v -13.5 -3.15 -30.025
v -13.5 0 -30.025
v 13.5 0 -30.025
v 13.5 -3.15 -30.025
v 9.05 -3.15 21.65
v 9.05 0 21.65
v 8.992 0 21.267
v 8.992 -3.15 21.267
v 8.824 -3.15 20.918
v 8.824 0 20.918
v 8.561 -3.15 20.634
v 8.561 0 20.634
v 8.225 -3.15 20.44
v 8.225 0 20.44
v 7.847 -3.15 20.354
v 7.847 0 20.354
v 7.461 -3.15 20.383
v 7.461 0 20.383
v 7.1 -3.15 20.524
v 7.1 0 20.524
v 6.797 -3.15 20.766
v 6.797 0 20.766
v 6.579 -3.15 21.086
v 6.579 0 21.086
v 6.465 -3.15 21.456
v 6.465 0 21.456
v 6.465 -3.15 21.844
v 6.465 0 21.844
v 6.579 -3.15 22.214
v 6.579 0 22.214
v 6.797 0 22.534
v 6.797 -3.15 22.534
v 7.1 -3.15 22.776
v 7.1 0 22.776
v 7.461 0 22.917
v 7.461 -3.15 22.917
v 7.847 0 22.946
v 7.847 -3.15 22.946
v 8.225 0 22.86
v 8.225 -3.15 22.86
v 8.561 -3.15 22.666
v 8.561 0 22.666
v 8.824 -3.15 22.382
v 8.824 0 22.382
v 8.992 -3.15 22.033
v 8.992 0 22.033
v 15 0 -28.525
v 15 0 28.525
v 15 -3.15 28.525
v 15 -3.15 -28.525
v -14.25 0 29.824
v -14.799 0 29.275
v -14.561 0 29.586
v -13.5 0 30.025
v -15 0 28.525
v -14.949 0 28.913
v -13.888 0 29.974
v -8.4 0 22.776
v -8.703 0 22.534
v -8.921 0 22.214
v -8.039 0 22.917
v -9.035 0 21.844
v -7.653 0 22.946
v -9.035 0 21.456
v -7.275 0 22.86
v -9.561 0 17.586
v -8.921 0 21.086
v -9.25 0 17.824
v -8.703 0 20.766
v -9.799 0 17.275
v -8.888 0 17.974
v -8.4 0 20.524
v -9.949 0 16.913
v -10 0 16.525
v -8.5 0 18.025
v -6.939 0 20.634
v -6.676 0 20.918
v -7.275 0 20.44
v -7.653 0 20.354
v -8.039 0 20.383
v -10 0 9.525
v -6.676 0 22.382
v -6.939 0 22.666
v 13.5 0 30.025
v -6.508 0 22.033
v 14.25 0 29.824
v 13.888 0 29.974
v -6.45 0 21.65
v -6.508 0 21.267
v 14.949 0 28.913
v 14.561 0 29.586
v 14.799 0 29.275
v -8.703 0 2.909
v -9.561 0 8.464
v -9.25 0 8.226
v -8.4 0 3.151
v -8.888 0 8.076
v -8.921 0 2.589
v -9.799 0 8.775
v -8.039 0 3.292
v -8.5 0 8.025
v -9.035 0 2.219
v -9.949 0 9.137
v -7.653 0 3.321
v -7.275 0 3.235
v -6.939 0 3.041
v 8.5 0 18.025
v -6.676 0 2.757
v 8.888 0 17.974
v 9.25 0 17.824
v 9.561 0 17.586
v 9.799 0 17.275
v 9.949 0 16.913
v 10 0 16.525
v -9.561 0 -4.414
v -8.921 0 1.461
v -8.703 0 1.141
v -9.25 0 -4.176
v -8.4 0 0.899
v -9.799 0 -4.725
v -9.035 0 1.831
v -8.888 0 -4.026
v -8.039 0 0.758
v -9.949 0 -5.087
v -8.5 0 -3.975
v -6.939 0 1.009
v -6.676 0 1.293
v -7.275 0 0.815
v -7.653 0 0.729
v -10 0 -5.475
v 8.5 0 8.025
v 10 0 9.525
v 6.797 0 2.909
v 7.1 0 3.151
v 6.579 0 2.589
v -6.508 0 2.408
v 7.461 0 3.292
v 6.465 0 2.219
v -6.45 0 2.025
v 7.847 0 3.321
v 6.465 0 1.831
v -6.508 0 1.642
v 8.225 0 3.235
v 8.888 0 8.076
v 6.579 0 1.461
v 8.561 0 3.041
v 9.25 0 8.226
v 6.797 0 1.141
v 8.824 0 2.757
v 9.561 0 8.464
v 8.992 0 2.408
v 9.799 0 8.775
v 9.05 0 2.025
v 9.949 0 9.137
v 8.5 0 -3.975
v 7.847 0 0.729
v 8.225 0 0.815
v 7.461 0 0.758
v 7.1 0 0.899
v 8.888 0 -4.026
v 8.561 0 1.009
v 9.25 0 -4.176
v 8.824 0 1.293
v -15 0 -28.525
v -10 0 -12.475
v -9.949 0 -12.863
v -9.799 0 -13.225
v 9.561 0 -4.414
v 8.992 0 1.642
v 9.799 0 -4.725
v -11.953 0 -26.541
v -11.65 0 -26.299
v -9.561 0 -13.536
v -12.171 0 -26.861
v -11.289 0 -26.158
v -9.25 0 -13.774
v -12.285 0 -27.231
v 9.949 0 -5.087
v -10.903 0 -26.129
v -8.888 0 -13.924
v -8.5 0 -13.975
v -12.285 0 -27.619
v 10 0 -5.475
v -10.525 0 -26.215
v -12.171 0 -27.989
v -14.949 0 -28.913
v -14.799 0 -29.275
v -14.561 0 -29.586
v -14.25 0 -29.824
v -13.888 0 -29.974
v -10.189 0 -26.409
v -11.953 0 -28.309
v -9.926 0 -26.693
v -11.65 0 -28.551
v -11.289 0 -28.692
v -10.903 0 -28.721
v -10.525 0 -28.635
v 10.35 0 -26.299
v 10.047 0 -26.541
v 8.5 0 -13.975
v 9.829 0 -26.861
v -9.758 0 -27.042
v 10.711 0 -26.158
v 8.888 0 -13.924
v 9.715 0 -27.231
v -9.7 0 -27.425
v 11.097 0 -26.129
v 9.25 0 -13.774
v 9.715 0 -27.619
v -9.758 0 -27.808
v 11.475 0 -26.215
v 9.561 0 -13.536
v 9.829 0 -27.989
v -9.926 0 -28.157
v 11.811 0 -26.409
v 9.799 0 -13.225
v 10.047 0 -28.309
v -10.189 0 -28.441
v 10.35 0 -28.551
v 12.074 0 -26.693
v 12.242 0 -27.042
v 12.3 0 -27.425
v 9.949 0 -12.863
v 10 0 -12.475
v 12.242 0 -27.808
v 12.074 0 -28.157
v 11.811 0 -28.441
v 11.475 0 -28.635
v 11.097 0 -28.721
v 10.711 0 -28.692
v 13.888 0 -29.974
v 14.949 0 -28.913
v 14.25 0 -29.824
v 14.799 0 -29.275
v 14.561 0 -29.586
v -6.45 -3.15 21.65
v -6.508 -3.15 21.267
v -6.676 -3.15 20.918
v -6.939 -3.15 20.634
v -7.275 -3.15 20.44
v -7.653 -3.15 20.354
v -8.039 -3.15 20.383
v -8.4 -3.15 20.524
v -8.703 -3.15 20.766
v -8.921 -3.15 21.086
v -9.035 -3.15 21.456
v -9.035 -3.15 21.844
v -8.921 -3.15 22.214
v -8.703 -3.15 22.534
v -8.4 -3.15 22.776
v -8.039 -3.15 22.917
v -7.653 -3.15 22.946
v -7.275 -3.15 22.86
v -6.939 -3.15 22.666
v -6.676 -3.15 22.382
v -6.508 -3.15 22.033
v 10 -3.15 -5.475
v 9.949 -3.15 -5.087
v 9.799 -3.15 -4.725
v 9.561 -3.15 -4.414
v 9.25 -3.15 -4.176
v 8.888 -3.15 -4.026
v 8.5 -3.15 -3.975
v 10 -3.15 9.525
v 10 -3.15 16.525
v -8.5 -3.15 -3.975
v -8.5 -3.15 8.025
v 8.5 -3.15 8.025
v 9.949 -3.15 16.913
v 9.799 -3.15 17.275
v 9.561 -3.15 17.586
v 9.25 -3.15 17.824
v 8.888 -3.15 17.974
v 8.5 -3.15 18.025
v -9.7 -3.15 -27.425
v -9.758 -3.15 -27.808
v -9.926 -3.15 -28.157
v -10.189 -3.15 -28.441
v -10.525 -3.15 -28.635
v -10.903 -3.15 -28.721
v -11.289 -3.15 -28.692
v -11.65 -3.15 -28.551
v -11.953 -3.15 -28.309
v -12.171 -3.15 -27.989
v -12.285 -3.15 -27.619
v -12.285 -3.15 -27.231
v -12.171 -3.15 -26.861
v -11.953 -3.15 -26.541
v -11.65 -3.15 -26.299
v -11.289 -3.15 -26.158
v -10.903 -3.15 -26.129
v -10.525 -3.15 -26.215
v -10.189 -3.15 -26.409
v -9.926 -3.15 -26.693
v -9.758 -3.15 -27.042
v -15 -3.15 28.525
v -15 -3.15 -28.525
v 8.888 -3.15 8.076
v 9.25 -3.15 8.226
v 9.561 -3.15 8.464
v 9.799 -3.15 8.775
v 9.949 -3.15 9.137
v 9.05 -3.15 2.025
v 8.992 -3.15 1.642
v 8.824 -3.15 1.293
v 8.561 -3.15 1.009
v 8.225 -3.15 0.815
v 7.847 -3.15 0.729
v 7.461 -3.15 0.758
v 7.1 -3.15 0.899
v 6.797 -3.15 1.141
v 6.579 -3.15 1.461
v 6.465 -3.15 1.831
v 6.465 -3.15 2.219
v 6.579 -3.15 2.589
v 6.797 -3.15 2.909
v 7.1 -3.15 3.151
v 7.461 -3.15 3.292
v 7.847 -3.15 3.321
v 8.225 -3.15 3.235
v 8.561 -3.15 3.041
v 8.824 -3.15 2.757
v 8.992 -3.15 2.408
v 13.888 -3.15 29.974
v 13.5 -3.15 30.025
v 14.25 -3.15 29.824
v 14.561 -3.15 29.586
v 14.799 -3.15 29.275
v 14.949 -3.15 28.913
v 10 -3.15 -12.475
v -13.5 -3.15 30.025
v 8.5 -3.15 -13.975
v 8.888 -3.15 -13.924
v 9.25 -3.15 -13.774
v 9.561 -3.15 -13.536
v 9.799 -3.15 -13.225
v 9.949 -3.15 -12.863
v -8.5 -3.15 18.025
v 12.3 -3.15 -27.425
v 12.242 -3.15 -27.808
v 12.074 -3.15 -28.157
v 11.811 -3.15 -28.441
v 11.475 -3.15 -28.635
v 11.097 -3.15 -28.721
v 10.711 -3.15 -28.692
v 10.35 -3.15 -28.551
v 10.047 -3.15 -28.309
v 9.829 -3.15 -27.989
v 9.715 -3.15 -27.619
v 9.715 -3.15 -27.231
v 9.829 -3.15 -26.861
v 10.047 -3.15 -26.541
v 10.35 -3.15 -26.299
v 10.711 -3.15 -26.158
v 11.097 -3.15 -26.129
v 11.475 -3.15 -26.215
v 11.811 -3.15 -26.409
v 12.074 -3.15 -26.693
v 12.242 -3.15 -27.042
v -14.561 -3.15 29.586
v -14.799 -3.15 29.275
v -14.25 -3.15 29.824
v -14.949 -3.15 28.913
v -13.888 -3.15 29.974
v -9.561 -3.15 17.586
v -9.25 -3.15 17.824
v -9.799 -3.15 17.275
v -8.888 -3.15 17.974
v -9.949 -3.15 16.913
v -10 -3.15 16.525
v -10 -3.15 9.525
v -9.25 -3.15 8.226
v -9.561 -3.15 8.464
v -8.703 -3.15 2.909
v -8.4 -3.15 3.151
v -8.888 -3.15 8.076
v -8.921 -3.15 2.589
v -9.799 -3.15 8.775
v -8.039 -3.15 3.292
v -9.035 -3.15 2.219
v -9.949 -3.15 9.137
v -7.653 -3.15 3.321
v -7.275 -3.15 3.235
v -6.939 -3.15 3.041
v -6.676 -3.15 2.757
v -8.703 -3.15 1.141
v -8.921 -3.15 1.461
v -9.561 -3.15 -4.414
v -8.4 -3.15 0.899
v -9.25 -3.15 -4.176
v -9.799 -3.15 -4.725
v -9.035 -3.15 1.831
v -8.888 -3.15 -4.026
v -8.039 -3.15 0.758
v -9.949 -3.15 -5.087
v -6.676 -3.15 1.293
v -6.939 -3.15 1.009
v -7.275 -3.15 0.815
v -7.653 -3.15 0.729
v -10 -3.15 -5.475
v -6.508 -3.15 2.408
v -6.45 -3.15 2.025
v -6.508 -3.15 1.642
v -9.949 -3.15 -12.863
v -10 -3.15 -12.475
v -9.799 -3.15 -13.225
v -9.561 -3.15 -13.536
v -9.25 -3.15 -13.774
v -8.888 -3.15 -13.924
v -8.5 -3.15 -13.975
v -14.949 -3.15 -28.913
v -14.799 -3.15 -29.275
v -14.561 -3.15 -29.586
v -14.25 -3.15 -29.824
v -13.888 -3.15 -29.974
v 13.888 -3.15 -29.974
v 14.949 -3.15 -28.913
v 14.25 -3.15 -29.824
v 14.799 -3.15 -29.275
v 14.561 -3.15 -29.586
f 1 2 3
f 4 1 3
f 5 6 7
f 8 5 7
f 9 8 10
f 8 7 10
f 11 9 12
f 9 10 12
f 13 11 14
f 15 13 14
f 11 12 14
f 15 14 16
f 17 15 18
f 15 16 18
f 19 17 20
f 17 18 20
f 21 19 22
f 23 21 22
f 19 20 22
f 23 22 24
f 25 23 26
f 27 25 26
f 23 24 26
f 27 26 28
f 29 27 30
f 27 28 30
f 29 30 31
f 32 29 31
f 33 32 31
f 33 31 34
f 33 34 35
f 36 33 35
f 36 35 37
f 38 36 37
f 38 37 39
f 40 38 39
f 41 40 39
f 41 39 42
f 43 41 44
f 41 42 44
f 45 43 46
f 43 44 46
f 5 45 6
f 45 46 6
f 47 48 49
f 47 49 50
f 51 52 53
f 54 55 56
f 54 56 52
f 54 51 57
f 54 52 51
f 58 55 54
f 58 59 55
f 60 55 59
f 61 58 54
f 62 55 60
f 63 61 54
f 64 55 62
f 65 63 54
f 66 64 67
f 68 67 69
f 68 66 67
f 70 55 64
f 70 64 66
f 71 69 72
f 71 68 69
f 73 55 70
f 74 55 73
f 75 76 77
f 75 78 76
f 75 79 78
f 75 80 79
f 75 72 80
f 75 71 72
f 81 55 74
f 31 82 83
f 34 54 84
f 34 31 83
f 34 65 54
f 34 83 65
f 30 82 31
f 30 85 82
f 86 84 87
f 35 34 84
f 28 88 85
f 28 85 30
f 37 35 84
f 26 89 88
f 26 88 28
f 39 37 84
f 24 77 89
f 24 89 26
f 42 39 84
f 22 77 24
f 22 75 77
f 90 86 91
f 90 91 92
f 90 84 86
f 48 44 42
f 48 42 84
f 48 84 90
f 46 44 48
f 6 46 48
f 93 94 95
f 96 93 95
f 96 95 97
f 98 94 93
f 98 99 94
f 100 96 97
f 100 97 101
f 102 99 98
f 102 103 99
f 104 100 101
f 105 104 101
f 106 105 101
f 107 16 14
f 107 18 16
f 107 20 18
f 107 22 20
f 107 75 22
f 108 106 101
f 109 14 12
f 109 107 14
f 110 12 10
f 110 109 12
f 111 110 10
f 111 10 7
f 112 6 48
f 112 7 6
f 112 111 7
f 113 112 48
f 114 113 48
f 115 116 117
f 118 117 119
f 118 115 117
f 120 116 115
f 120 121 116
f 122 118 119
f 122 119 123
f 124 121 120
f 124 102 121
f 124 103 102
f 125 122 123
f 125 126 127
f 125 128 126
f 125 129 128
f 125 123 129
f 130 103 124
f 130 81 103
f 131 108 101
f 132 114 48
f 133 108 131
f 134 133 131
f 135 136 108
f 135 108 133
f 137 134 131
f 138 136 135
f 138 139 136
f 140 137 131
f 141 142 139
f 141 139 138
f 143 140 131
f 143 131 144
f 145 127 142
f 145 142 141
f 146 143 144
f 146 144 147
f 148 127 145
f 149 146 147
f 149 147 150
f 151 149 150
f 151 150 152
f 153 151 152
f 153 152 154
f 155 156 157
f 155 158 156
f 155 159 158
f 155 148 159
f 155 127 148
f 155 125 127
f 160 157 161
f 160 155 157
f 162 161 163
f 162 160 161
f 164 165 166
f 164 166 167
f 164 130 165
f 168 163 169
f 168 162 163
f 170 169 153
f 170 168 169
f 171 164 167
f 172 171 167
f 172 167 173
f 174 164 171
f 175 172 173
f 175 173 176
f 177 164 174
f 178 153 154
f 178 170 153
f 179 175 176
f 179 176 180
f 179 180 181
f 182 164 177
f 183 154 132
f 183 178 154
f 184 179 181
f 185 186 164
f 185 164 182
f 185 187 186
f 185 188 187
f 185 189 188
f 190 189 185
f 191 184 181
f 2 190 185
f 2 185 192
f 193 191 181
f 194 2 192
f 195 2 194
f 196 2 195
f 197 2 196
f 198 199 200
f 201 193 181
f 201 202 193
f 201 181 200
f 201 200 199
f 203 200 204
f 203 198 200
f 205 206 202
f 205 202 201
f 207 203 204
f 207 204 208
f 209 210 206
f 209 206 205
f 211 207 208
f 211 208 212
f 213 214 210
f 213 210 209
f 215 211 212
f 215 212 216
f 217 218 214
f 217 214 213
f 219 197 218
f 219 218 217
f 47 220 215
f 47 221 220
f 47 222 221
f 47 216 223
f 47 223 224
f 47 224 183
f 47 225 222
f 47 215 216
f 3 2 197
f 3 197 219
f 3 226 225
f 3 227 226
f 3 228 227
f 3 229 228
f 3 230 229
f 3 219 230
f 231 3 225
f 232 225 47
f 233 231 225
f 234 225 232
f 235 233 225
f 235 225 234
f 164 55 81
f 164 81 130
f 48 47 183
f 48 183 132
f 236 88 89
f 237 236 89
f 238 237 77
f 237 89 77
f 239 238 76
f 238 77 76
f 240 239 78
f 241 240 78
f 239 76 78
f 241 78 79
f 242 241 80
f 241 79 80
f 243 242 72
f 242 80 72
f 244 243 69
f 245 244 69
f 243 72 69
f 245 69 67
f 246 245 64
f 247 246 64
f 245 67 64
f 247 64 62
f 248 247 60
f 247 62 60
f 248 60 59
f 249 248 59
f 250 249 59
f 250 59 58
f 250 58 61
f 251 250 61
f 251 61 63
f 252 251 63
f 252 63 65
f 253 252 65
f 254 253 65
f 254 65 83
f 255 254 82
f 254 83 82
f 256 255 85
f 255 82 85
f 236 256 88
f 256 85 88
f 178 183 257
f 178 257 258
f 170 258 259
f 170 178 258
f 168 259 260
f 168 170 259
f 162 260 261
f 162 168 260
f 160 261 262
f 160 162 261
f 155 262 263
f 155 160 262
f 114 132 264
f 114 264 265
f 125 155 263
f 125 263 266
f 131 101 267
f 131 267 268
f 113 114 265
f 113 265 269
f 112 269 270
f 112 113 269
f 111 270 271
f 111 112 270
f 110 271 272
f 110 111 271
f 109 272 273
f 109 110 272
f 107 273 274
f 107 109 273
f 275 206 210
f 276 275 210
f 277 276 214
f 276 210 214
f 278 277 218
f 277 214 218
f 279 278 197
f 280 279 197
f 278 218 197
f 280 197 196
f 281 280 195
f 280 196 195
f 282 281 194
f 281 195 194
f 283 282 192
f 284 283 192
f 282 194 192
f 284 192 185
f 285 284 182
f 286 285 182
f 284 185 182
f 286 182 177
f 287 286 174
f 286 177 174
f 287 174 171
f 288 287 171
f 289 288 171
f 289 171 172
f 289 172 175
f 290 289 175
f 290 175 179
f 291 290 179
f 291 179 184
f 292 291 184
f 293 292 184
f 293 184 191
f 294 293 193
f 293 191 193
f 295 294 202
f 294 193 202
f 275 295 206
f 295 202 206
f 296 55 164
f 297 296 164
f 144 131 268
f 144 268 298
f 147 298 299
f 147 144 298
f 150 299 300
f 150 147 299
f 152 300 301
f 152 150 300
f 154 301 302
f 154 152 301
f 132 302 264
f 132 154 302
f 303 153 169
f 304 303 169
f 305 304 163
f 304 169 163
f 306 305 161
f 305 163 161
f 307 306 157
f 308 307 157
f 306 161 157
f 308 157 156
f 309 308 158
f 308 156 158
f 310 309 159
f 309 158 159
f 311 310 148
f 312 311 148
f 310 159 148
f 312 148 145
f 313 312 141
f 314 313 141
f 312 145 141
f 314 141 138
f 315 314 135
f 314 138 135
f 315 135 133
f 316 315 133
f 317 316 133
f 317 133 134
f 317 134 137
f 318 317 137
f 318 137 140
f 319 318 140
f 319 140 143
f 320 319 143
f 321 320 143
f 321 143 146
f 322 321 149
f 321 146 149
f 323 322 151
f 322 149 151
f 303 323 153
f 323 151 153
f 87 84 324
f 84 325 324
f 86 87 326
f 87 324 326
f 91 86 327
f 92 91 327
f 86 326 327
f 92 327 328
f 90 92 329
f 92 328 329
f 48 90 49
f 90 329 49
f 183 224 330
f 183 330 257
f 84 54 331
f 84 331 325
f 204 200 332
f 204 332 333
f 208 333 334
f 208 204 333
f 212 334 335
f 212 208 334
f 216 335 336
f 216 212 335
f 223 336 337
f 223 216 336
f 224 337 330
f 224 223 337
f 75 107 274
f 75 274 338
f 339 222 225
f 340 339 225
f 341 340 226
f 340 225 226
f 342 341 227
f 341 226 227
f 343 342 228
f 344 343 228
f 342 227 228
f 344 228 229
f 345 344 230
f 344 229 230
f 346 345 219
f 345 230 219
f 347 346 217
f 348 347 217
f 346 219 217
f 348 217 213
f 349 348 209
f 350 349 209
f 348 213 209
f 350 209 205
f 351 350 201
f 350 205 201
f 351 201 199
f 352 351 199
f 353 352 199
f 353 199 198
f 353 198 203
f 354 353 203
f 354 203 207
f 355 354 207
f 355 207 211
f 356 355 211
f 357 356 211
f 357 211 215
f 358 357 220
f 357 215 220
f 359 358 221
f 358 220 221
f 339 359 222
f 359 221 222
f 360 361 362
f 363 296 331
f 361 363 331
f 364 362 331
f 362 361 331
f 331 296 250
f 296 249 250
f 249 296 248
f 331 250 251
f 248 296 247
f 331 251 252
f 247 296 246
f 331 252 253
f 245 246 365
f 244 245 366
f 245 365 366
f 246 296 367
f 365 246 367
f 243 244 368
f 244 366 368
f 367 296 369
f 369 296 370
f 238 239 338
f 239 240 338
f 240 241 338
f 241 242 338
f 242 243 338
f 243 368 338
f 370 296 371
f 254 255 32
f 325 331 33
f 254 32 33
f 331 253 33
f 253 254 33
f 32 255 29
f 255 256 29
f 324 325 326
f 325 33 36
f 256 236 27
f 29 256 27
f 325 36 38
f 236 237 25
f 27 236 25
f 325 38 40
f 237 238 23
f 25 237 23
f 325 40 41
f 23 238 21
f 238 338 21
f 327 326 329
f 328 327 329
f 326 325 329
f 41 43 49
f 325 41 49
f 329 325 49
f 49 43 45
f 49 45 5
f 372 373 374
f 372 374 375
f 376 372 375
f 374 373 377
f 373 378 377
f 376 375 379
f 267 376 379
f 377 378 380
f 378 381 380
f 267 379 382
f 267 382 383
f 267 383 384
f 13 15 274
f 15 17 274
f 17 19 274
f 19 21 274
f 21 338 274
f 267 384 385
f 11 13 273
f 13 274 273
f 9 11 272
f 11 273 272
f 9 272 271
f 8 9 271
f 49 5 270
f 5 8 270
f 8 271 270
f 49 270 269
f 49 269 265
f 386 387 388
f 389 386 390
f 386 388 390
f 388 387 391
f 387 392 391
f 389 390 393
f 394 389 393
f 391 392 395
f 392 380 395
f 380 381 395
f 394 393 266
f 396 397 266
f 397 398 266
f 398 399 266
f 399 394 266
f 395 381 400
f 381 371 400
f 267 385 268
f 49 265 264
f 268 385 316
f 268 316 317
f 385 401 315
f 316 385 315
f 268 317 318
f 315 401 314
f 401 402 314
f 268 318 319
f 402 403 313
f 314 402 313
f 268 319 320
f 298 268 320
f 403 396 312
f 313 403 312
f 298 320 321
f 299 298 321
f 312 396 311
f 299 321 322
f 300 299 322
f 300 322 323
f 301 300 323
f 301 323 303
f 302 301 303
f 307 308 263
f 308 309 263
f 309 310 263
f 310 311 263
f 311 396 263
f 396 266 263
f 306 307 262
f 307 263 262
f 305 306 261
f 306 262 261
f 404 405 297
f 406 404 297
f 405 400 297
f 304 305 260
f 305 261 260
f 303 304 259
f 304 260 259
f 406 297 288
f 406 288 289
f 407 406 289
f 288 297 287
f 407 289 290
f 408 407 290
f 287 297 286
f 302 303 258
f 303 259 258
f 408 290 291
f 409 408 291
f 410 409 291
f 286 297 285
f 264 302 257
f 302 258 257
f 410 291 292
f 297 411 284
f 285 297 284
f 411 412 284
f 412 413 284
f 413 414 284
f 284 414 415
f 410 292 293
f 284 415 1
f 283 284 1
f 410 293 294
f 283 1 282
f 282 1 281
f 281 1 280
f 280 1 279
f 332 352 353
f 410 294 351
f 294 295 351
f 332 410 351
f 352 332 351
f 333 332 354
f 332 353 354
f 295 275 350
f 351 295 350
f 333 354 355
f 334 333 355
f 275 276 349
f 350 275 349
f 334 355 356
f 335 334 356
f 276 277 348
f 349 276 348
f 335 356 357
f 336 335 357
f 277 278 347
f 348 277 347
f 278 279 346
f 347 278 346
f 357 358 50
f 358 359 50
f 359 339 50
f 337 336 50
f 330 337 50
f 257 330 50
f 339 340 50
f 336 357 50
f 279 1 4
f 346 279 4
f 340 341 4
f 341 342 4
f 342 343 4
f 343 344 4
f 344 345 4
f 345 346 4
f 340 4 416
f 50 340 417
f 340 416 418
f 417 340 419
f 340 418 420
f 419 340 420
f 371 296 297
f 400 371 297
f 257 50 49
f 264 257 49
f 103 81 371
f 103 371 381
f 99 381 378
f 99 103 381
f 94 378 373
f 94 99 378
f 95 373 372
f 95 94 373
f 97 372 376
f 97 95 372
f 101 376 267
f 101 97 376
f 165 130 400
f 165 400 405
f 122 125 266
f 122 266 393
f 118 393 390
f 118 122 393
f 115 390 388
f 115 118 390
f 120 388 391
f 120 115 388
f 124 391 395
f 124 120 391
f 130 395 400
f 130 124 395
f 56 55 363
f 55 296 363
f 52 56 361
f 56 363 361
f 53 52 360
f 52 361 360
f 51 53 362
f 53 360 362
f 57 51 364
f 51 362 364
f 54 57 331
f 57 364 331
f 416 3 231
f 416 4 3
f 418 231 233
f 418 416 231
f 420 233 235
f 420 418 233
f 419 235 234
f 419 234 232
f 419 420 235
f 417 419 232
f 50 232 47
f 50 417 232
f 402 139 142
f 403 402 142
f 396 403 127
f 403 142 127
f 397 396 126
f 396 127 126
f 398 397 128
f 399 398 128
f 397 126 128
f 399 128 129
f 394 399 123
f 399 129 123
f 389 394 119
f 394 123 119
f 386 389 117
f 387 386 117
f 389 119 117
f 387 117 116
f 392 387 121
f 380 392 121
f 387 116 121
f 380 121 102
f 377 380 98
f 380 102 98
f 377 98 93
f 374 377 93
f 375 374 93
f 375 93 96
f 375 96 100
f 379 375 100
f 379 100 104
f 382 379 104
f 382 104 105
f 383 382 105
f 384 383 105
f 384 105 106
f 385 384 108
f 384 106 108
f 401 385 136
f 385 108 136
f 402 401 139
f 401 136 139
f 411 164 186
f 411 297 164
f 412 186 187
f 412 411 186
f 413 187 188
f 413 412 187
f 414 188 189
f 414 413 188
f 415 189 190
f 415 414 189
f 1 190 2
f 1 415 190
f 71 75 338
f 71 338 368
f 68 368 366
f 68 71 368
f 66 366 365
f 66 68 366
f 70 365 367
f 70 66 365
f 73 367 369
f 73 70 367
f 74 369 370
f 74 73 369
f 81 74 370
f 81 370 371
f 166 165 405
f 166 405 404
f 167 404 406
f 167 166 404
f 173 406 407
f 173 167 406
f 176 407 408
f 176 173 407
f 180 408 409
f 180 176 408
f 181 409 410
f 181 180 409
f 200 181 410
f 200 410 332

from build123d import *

# Parameters (mm, degrees)
SKETCH1_W           = 30
SKETCH1_H           = 60.05
BOSS_EXTRUDE1_DEPTH = 3.15
CUT_EXTRUDE1_DEPTH  = 3.15
SKETCH3_R           = 1.3
CUT_EXTRUDE2_DEPTH  = 3.15
FILLET1_R           = 1.5
SKETCH5_R           = 1.3
CUT_EXTRUDE3_DEPTH  = 3.15


with BuildPart() as part:
    # Sketch1 → Boss-Extrude1 (new body)
    with BuildSketch(Plane(origin=(0, 0, 0), x_dir=(1, 0, 0), z_dir=(0, 1, 0))):
        Rectangle(SKETCH1_W, SKETCH1_H)
    extrude(amount=-BOSS_EXTRUDE1_DEPTH)

    # Sketch2 → Cut-Extrude1 (cut)
    with BuildSketch(Plane(origin=(0, 0, 0), x_dir=(1, 0, 0), z_dir=(0, 1, 0))):
        with BuildLine():
            Line((-8.5, 13.975), (8.5, 13.975))
            ThreePointArc((8.5, 13.975), (9.560660172, 13.535660172), (10, 12.475))
            Line((10, 12.475), (10, 5.475))
            ThreePointArc((10, 5.475), (9.560660172, 4.414339828), (8.5, 3.975))
            Line((8.5, 3.975), (-8.5, 3.975))
            ThreePointArc((-8.5, 3.975), (-9.560660172, 4.414339828), (-10, 5.475))
            Line((-10, 5.475), (-10, 12.475))
            ThreePointArc((-10, 12.475), (-9.560660172, 13.535660172), (-8.5, 13.975))
        make_face()
        with BuildLine():
            Line((-8.5, -8.025), (8.5, -8.025))
            ThreePointArc((8.5, -8.025), (9.560660172, -8.464339828), (10, -9.525))
            Line((10, -9.525), (10, -16.525))
            ThreePointArc((10, -16.525), (9.560660172, -17.585660172), (8.5, -18.025))
            Line((8.5, -18.025), (-8.5, -18.025))
            ThreePointArc((-8.5, -18.025), (-9.560660172, -17.585660172), (-10, -16.525))
            Line((-10, -16.525), (-10, -9.525))
            ThreePointArc((-10, -9.525), (-9.560660172, -8.464339828), (-8.5, -8.025))
        make_face()
    extrude(amount=-CUT_EXTRUDE1_DEPTH, mode=Mode.SUBTRACT)

    # Sketch3 → Cut-Extrude2 (cut)
    with BuildSketch(Plane(origin=(0, 0, 0), x_dir=(1, 0, 0), z_dir=(0, 1, 0))):
        with Locations((-11, 27.425)):
            Circle(SKETCH3_R)
        with Locations((11, 27.425)):
            Circle(SKETCH3_R)
    extrude(amount=-CUT_EXTRUDE2_DEPTH, mode=Mode.SUBTRACT)

    # Fillet1
    fillet1_edges = [part.edges().sort_by_distance(p)[0] for p in [
        (-15, -1.575, -30.025),
        (15, -1.575, -30.025),
        (15, -1.575, 30.025),
        (-15, -1.575, 30.025),
    ]]
    fillet(fillet1_edges, radius=FILLET1_R)

    # Sketch5 → Cut-Extrude3 (cut)
    with BuildSketch(Plane(origin=(0, 0, 0), x_dir=(1, 0, 0), z_dir=(0, 1, 0))):
        with Locations((-7.75, -2.025)):
            Circle(SKETCH5_R)
        with Locations((7.75, -2.025)):
            Circle(SKETCH5_R)
        with Locations((-7.75, -21.65)):
            Circle(SKETCH5_R)
        with Locations((7.75, -21.65)):
            Circle(SKETCH5_R)
    extrude(amount=-CUT_EXTRUDE3_DEPTH, mode=Mode.SUBTRACT)


solid = part.part
